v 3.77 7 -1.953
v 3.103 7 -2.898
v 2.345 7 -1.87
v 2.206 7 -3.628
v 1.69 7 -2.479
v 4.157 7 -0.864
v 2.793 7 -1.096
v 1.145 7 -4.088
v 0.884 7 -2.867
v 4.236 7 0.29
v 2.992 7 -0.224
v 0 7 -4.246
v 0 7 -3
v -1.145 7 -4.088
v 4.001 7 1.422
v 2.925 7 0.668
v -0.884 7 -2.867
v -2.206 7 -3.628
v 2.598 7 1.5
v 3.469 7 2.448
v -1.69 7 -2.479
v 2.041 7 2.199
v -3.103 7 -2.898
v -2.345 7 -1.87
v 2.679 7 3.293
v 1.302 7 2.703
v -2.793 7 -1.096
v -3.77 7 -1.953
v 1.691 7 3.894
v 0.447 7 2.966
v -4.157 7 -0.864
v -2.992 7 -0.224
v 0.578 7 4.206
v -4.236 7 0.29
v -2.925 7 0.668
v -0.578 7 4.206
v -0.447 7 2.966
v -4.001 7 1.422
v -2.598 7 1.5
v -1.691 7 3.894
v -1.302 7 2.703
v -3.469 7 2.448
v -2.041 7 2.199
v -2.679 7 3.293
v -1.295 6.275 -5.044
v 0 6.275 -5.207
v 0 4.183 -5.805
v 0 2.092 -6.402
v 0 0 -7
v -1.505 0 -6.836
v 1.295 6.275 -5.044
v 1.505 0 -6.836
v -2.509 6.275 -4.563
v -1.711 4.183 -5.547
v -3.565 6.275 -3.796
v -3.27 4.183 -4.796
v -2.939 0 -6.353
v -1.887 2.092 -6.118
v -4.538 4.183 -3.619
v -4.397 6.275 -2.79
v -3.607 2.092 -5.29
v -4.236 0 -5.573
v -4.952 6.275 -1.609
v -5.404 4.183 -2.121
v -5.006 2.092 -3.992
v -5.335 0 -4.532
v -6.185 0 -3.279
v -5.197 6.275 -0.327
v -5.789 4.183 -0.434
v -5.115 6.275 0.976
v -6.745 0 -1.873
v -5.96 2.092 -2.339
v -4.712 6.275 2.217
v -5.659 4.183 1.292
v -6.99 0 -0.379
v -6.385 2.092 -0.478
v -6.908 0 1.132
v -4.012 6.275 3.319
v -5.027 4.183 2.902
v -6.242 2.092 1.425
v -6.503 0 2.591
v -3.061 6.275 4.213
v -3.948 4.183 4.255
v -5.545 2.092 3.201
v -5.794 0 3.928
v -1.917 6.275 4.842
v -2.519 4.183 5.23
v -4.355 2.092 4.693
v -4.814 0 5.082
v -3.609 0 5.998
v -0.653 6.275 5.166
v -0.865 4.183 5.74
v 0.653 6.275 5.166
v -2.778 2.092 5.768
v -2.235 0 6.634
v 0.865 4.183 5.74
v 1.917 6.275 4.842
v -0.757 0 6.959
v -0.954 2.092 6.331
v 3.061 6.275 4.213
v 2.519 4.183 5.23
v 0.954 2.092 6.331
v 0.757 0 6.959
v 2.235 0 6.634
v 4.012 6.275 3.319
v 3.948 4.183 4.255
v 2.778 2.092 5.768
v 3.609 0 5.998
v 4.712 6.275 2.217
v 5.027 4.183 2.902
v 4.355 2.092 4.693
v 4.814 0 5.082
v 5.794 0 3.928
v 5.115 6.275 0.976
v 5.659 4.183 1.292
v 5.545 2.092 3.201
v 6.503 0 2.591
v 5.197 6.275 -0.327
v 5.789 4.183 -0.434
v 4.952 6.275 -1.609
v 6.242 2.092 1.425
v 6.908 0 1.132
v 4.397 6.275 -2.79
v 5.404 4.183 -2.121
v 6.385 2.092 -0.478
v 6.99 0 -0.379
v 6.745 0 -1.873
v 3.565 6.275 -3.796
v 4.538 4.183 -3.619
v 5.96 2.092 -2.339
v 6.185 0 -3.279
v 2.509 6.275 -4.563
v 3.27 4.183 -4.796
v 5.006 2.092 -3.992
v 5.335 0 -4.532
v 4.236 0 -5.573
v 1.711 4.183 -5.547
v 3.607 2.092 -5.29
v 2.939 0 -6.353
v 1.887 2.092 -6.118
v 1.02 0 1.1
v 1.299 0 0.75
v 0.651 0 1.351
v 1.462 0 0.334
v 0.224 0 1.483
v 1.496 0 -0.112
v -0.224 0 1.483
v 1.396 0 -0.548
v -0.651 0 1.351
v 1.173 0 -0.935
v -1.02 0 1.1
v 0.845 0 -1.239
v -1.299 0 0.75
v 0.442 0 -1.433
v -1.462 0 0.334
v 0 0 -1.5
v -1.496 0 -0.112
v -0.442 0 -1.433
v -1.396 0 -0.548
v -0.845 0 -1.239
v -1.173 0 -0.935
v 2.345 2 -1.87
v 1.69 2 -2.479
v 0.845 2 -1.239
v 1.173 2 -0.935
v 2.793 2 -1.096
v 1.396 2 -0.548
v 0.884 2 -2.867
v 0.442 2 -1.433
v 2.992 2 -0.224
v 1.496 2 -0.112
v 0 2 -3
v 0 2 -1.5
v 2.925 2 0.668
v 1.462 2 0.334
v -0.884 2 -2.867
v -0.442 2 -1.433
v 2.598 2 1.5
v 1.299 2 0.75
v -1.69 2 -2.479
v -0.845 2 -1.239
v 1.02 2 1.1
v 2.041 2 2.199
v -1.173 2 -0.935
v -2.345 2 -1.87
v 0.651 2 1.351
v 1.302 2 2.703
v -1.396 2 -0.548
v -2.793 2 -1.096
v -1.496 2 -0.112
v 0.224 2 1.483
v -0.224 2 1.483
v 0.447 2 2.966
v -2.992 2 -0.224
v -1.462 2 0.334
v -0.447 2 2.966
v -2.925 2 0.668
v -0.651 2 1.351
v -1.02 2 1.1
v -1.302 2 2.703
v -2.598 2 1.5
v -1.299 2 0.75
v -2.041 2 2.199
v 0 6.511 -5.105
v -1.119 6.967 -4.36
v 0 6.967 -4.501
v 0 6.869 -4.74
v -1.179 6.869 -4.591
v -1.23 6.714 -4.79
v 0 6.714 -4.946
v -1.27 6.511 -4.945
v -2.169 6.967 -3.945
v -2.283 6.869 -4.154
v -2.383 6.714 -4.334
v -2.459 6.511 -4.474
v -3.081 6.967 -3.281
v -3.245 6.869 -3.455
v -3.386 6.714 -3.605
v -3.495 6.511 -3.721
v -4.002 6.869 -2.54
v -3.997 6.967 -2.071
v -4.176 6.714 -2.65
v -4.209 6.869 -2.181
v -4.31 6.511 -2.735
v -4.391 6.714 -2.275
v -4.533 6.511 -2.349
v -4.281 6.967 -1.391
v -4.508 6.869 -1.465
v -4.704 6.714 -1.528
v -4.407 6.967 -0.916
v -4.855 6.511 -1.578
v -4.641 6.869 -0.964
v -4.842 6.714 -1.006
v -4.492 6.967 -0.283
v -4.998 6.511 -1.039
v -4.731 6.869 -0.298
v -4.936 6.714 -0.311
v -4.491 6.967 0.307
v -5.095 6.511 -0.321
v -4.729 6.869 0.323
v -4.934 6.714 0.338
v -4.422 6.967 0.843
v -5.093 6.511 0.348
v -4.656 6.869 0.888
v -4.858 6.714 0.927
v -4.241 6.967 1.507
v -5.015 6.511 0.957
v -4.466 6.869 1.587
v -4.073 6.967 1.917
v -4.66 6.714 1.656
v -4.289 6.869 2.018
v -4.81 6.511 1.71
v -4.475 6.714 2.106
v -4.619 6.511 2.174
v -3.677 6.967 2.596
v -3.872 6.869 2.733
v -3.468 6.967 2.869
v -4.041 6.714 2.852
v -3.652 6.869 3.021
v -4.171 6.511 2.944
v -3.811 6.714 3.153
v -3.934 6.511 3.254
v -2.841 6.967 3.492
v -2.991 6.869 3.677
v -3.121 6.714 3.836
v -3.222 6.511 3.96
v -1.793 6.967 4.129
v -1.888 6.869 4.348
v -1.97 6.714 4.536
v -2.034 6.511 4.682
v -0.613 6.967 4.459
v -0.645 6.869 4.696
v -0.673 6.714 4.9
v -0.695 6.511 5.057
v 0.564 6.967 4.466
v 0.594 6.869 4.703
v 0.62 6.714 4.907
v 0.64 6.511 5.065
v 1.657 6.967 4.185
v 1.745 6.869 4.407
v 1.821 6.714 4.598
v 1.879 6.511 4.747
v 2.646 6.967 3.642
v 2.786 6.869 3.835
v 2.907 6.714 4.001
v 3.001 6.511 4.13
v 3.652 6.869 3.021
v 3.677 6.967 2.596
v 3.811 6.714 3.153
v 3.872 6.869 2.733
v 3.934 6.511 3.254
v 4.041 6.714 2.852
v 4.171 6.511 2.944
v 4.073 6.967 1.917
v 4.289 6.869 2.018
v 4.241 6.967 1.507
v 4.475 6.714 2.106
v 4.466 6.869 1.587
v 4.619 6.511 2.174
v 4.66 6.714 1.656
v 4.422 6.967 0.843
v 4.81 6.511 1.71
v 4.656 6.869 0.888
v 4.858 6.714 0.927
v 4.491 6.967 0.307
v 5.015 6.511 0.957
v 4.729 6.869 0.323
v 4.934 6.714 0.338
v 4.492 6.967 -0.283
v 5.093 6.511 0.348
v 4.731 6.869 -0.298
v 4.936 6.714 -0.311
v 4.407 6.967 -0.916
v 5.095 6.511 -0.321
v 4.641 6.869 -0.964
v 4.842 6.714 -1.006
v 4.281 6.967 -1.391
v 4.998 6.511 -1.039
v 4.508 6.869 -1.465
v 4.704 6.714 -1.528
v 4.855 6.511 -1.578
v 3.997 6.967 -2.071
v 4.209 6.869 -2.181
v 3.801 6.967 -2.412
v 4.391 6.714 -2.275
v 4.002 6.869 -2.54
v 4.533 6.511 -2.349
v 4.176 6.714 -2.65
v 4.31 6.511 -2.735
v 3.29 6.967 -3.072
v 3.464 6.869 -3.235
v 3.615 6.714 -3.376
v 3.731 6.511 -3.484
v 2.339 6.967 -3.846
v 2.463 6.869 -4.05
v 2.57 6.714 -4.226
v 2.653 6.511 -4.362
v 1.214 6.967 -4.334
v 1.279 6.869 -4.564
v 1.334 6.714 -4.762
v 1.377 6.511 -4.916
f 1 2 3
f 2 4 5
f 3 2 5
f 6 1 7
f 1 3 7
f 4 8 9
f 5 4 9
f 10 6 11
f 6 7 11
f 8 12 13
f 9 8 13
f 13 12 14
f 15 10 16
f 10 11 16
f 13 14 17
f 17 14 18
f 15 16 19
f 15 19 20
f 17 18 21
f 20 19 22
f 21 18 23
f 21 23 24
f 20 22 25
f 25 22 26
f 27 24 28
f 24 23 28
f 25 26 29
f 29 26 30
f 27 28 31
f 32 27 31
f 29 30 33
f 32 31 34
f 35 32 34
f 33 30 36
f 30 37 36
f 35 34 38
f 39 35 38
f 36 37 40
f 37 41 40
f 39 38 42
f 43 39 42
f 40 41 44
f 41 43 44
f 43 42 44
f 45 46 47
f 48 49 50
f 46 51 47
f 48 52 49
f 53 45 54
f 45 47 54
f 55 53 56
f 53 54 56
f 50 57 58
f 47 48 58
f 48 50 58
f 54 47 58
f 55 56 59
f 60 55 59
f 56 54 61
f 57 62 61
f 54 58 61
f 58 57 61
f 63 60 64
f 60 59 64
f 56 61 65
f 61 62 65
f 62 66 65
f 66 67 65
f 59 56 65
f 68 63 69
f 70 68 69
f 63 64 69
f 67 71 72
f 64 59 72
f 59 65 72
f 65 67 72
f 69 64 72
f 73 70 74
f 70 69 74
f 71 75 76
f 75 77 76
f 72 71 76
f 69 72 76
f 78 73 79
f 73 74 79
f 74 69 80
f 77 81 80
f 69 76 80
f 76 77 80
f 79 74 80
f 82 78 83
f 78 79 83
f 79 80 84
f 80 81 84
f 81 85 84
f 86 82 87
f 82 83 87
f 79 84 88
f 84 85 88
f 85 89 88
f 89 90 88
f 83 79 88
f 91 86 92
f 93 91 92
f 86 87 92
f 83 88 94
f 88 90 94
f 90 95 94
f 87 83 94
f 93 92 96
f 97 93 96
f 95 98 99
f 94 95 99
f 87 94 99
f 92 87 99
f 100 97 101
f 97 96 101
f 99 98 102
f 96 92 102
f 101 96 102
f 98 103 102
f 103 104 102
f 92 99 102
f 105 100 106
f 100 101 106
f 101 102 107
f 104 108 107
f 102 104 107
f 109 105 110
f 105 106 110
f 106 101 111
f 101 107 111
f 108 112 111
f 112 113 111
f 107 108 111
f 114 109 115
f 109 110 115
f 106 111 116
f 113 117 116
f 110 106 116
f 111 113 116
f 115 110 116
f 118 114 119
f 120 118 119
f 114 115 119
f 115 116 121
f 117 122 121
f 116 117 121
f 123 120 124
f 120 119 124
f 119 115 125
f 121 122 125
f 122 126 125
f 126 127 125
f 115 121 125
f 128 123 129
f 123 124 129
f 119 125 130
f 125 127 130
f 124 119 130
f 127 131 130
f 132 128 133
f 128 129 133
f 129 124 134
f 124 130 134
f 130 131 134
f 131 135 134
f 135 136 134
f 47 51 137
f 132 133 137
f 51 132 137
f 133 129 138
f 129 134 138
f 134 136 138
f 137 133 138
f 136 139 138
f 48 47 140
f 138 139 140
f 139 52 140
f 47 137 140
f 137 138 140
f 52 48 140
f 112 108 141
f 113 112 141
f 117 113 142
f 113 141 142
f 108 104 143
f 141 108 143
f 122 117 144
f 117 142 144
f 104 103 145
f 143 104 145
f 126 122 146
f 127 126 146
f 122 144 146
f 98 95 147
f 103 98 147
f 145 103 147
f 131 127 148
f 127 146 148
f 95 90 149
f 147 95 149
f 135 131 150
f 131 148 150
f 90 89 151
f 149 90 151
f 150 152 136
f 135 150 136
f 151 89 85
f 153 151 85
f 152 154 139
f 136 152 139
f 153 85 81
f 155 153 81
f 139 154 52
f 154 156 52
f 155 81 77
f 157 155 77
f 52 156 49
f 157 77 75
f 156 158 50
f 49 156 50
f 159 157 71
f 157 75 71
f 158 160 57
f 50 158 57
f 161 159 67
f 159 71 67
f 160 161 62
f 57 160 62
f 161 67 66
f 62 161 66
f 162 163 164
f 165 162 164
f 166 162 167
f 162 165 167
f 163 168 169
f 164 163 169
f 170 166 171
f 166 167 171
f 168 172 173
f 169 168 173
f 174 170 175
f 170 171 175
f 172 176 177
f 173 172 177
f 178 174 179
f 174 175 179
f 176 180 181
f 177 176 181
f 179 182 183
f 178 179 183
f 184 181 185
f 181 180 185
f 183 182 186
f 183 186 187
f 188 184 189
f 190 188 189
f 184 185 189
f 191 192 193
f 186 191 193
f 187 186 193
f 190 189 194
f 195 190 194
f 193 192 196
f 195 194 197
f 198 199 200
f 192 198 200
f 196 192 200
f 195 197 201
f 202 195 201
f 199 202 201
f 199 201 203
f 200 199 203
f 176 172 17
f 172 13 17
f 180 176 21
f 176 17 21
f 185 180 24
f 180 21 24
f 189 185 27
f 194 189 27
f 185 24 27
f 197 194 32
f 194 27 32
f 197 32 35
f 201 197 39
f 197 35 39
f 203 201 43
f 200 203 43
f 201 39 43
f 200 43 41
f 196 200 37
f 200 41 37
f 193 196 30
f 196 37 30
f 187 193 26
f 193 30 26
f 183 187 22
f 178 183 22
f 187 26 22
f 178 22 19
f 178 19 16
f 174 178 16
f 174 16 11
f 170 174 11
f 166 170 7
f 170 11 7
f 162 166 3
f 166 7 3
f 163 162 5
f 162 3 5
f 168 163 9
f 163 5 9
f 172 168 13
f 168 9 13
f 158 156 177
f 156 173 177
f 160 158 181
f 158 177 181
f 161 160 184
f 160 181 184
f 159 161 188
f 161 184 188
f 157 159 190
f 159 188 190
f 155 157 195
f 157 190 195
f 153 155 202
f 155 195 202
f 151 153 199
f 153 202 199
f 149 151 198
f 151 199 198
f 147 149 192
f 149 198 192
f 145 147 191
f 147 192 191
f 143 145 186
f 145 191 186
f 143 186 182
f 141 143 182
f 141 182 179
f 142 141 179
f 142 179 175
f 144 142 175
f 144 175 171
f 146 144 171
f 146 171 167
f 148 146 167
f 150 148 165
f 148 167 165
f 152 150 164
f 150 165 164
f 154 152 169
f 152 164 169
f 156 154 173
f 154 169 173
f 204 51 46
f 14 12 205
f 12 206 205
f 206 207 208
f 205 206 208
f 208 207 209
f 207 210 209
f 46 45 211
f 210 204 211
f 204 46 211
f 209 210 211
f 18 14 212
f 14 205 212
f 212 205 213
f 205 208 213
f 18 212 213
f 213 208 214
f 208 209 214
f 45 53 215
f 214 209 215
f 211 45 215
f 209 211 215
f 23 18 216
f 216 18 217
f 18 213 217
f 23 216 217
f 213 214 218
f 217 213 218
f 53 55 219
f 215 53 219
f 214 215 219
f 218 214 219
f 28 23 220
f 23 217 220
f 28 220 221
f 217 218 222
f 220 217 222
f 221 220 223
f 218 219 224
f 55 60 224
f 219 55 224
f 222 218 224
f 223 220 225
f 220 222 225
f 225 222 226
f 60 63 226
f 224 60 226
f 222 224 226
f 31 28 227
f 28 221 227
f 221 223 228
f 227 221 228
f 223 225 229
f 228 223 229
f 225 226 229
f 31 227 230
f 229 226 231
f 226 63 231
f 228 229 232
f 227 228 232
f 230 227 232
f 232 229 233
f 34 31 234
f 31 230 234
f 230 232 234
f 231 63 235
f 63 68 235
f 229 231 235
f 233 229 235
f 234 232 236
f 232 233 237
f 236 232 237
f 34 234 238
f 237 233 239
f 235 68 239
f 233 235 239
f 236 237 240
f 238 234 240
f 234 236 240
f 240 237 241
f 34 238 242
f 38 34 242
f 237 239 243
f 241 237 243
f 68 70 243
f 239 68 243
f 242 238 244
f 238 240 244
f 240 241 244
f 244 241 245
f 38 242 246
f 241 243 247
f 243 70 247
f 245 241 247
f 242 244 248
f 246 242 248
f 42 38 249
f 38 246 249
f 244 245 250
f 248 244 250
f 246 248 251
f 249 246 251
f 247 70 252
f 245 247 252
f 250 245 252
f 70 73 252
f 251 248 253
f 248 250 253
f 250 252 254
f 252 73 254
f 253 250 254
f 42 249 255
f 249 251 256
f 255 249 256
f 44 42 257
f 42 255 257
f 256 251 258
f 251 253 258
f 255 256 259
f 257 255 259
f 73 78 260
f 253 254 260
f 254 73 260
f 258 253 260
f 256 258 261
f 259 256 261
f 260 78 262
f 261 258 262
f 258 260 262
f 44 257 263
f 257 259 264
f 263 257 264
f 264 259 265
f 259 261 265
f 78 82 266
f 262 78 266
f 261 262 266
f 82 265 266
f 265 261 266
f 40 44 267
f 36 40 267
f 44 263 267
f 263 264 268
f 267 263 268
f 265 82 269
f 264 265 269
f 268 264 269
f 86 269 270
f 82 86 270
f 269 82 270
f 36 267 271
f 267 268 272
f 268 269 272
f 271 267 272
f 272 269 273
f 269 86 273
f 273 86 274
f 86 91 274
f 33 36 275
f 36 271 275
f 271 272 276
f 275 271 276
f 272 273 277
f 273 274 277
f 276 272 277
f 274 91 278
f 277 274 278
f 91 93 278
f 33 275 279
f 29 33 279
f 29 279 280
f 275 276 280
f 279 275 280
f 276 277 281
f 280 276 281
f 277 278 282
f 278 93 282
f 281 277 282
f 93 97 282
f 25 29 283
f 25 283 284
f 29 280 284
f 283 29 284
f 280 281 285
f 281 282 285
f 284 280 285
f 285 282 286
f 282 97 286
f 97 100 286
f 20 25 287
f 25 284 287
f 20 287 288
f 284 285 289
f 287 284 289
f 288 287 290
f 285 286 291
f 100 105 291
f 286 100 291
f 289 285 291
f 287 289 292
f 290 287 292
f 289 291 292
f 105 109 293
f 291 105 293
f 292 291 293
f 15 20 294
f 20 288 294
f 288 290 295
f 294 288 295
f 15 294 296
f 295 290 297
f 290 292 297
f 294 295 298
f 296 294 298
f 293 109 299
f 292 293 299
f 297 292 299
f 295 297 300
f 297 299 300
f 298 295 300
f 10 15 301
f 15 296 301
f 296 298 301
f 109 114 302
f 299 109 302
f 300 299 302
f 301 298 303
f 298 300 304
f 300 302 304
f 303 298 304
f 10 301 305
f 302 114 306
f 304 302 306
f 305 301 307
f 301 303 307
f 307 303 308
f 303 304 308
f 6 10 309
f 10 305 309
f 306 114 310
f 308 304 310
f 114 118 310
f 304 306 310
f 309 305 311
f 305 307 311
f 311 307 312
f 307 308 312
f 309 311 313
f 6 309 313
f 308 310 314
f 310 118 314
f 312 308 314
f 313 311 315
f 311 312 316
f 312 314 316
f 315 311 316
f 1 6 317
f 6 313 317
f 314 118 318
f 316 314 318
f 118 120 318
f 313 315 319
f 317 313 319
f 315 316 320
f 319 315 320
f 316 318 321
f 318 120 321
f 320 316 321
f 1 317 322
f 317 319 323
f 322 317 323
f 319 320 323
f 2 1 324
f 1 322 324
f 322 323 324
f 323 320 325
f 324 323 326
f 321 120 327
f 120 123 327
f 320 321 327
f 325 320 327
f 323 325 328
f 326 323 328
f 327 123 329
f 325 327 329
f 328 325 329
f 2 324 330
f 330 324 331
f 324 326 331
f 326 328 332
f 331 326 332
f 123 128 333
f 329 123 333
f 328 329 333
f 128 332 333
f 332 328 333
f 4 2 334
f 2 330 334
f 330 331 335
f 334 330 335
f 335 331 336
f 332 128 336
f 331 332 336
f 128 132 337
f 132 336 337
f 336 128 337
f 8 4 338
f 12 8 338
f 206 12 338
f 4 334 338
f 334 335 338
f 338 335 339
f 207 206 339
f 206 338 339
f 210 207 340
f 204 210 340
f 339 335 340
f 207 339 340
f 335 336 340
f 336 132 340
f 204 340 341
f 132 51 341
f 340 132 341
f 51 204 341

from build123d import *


with BuildPart() as part:
    # Croquis1 → Revolución1 (revolve)
    with BuildSketch(Plane.XY, mode=Mode.PRIVATE) as revoluci_n1_sk:
        with BuildLine():
            Line((-7, 0), (-1.5, 0))
            Line((-1.5, 0), (-1.5, 2))
            Line((-1.5, 2), (-3, 2))
            Line((-3, 2), (-3, 7))
            Line((-3, 7), (-4.245698587, 7))
            ThreePointArc((-4.245698587, 7), (-4.8478941, 6.798348648), (-5.207222535, 6.274721128))
            Line((-5.207222535, 6.274721128), (-7, 0))
        make_face()
    revolve(revoluci_n1_sk.sketch.rotate(Axis((0, 0, 0), (0, 1, 0)), 270), axis=Axis((0, 0, 0), (0, 1, 0)))


solid = part.part
